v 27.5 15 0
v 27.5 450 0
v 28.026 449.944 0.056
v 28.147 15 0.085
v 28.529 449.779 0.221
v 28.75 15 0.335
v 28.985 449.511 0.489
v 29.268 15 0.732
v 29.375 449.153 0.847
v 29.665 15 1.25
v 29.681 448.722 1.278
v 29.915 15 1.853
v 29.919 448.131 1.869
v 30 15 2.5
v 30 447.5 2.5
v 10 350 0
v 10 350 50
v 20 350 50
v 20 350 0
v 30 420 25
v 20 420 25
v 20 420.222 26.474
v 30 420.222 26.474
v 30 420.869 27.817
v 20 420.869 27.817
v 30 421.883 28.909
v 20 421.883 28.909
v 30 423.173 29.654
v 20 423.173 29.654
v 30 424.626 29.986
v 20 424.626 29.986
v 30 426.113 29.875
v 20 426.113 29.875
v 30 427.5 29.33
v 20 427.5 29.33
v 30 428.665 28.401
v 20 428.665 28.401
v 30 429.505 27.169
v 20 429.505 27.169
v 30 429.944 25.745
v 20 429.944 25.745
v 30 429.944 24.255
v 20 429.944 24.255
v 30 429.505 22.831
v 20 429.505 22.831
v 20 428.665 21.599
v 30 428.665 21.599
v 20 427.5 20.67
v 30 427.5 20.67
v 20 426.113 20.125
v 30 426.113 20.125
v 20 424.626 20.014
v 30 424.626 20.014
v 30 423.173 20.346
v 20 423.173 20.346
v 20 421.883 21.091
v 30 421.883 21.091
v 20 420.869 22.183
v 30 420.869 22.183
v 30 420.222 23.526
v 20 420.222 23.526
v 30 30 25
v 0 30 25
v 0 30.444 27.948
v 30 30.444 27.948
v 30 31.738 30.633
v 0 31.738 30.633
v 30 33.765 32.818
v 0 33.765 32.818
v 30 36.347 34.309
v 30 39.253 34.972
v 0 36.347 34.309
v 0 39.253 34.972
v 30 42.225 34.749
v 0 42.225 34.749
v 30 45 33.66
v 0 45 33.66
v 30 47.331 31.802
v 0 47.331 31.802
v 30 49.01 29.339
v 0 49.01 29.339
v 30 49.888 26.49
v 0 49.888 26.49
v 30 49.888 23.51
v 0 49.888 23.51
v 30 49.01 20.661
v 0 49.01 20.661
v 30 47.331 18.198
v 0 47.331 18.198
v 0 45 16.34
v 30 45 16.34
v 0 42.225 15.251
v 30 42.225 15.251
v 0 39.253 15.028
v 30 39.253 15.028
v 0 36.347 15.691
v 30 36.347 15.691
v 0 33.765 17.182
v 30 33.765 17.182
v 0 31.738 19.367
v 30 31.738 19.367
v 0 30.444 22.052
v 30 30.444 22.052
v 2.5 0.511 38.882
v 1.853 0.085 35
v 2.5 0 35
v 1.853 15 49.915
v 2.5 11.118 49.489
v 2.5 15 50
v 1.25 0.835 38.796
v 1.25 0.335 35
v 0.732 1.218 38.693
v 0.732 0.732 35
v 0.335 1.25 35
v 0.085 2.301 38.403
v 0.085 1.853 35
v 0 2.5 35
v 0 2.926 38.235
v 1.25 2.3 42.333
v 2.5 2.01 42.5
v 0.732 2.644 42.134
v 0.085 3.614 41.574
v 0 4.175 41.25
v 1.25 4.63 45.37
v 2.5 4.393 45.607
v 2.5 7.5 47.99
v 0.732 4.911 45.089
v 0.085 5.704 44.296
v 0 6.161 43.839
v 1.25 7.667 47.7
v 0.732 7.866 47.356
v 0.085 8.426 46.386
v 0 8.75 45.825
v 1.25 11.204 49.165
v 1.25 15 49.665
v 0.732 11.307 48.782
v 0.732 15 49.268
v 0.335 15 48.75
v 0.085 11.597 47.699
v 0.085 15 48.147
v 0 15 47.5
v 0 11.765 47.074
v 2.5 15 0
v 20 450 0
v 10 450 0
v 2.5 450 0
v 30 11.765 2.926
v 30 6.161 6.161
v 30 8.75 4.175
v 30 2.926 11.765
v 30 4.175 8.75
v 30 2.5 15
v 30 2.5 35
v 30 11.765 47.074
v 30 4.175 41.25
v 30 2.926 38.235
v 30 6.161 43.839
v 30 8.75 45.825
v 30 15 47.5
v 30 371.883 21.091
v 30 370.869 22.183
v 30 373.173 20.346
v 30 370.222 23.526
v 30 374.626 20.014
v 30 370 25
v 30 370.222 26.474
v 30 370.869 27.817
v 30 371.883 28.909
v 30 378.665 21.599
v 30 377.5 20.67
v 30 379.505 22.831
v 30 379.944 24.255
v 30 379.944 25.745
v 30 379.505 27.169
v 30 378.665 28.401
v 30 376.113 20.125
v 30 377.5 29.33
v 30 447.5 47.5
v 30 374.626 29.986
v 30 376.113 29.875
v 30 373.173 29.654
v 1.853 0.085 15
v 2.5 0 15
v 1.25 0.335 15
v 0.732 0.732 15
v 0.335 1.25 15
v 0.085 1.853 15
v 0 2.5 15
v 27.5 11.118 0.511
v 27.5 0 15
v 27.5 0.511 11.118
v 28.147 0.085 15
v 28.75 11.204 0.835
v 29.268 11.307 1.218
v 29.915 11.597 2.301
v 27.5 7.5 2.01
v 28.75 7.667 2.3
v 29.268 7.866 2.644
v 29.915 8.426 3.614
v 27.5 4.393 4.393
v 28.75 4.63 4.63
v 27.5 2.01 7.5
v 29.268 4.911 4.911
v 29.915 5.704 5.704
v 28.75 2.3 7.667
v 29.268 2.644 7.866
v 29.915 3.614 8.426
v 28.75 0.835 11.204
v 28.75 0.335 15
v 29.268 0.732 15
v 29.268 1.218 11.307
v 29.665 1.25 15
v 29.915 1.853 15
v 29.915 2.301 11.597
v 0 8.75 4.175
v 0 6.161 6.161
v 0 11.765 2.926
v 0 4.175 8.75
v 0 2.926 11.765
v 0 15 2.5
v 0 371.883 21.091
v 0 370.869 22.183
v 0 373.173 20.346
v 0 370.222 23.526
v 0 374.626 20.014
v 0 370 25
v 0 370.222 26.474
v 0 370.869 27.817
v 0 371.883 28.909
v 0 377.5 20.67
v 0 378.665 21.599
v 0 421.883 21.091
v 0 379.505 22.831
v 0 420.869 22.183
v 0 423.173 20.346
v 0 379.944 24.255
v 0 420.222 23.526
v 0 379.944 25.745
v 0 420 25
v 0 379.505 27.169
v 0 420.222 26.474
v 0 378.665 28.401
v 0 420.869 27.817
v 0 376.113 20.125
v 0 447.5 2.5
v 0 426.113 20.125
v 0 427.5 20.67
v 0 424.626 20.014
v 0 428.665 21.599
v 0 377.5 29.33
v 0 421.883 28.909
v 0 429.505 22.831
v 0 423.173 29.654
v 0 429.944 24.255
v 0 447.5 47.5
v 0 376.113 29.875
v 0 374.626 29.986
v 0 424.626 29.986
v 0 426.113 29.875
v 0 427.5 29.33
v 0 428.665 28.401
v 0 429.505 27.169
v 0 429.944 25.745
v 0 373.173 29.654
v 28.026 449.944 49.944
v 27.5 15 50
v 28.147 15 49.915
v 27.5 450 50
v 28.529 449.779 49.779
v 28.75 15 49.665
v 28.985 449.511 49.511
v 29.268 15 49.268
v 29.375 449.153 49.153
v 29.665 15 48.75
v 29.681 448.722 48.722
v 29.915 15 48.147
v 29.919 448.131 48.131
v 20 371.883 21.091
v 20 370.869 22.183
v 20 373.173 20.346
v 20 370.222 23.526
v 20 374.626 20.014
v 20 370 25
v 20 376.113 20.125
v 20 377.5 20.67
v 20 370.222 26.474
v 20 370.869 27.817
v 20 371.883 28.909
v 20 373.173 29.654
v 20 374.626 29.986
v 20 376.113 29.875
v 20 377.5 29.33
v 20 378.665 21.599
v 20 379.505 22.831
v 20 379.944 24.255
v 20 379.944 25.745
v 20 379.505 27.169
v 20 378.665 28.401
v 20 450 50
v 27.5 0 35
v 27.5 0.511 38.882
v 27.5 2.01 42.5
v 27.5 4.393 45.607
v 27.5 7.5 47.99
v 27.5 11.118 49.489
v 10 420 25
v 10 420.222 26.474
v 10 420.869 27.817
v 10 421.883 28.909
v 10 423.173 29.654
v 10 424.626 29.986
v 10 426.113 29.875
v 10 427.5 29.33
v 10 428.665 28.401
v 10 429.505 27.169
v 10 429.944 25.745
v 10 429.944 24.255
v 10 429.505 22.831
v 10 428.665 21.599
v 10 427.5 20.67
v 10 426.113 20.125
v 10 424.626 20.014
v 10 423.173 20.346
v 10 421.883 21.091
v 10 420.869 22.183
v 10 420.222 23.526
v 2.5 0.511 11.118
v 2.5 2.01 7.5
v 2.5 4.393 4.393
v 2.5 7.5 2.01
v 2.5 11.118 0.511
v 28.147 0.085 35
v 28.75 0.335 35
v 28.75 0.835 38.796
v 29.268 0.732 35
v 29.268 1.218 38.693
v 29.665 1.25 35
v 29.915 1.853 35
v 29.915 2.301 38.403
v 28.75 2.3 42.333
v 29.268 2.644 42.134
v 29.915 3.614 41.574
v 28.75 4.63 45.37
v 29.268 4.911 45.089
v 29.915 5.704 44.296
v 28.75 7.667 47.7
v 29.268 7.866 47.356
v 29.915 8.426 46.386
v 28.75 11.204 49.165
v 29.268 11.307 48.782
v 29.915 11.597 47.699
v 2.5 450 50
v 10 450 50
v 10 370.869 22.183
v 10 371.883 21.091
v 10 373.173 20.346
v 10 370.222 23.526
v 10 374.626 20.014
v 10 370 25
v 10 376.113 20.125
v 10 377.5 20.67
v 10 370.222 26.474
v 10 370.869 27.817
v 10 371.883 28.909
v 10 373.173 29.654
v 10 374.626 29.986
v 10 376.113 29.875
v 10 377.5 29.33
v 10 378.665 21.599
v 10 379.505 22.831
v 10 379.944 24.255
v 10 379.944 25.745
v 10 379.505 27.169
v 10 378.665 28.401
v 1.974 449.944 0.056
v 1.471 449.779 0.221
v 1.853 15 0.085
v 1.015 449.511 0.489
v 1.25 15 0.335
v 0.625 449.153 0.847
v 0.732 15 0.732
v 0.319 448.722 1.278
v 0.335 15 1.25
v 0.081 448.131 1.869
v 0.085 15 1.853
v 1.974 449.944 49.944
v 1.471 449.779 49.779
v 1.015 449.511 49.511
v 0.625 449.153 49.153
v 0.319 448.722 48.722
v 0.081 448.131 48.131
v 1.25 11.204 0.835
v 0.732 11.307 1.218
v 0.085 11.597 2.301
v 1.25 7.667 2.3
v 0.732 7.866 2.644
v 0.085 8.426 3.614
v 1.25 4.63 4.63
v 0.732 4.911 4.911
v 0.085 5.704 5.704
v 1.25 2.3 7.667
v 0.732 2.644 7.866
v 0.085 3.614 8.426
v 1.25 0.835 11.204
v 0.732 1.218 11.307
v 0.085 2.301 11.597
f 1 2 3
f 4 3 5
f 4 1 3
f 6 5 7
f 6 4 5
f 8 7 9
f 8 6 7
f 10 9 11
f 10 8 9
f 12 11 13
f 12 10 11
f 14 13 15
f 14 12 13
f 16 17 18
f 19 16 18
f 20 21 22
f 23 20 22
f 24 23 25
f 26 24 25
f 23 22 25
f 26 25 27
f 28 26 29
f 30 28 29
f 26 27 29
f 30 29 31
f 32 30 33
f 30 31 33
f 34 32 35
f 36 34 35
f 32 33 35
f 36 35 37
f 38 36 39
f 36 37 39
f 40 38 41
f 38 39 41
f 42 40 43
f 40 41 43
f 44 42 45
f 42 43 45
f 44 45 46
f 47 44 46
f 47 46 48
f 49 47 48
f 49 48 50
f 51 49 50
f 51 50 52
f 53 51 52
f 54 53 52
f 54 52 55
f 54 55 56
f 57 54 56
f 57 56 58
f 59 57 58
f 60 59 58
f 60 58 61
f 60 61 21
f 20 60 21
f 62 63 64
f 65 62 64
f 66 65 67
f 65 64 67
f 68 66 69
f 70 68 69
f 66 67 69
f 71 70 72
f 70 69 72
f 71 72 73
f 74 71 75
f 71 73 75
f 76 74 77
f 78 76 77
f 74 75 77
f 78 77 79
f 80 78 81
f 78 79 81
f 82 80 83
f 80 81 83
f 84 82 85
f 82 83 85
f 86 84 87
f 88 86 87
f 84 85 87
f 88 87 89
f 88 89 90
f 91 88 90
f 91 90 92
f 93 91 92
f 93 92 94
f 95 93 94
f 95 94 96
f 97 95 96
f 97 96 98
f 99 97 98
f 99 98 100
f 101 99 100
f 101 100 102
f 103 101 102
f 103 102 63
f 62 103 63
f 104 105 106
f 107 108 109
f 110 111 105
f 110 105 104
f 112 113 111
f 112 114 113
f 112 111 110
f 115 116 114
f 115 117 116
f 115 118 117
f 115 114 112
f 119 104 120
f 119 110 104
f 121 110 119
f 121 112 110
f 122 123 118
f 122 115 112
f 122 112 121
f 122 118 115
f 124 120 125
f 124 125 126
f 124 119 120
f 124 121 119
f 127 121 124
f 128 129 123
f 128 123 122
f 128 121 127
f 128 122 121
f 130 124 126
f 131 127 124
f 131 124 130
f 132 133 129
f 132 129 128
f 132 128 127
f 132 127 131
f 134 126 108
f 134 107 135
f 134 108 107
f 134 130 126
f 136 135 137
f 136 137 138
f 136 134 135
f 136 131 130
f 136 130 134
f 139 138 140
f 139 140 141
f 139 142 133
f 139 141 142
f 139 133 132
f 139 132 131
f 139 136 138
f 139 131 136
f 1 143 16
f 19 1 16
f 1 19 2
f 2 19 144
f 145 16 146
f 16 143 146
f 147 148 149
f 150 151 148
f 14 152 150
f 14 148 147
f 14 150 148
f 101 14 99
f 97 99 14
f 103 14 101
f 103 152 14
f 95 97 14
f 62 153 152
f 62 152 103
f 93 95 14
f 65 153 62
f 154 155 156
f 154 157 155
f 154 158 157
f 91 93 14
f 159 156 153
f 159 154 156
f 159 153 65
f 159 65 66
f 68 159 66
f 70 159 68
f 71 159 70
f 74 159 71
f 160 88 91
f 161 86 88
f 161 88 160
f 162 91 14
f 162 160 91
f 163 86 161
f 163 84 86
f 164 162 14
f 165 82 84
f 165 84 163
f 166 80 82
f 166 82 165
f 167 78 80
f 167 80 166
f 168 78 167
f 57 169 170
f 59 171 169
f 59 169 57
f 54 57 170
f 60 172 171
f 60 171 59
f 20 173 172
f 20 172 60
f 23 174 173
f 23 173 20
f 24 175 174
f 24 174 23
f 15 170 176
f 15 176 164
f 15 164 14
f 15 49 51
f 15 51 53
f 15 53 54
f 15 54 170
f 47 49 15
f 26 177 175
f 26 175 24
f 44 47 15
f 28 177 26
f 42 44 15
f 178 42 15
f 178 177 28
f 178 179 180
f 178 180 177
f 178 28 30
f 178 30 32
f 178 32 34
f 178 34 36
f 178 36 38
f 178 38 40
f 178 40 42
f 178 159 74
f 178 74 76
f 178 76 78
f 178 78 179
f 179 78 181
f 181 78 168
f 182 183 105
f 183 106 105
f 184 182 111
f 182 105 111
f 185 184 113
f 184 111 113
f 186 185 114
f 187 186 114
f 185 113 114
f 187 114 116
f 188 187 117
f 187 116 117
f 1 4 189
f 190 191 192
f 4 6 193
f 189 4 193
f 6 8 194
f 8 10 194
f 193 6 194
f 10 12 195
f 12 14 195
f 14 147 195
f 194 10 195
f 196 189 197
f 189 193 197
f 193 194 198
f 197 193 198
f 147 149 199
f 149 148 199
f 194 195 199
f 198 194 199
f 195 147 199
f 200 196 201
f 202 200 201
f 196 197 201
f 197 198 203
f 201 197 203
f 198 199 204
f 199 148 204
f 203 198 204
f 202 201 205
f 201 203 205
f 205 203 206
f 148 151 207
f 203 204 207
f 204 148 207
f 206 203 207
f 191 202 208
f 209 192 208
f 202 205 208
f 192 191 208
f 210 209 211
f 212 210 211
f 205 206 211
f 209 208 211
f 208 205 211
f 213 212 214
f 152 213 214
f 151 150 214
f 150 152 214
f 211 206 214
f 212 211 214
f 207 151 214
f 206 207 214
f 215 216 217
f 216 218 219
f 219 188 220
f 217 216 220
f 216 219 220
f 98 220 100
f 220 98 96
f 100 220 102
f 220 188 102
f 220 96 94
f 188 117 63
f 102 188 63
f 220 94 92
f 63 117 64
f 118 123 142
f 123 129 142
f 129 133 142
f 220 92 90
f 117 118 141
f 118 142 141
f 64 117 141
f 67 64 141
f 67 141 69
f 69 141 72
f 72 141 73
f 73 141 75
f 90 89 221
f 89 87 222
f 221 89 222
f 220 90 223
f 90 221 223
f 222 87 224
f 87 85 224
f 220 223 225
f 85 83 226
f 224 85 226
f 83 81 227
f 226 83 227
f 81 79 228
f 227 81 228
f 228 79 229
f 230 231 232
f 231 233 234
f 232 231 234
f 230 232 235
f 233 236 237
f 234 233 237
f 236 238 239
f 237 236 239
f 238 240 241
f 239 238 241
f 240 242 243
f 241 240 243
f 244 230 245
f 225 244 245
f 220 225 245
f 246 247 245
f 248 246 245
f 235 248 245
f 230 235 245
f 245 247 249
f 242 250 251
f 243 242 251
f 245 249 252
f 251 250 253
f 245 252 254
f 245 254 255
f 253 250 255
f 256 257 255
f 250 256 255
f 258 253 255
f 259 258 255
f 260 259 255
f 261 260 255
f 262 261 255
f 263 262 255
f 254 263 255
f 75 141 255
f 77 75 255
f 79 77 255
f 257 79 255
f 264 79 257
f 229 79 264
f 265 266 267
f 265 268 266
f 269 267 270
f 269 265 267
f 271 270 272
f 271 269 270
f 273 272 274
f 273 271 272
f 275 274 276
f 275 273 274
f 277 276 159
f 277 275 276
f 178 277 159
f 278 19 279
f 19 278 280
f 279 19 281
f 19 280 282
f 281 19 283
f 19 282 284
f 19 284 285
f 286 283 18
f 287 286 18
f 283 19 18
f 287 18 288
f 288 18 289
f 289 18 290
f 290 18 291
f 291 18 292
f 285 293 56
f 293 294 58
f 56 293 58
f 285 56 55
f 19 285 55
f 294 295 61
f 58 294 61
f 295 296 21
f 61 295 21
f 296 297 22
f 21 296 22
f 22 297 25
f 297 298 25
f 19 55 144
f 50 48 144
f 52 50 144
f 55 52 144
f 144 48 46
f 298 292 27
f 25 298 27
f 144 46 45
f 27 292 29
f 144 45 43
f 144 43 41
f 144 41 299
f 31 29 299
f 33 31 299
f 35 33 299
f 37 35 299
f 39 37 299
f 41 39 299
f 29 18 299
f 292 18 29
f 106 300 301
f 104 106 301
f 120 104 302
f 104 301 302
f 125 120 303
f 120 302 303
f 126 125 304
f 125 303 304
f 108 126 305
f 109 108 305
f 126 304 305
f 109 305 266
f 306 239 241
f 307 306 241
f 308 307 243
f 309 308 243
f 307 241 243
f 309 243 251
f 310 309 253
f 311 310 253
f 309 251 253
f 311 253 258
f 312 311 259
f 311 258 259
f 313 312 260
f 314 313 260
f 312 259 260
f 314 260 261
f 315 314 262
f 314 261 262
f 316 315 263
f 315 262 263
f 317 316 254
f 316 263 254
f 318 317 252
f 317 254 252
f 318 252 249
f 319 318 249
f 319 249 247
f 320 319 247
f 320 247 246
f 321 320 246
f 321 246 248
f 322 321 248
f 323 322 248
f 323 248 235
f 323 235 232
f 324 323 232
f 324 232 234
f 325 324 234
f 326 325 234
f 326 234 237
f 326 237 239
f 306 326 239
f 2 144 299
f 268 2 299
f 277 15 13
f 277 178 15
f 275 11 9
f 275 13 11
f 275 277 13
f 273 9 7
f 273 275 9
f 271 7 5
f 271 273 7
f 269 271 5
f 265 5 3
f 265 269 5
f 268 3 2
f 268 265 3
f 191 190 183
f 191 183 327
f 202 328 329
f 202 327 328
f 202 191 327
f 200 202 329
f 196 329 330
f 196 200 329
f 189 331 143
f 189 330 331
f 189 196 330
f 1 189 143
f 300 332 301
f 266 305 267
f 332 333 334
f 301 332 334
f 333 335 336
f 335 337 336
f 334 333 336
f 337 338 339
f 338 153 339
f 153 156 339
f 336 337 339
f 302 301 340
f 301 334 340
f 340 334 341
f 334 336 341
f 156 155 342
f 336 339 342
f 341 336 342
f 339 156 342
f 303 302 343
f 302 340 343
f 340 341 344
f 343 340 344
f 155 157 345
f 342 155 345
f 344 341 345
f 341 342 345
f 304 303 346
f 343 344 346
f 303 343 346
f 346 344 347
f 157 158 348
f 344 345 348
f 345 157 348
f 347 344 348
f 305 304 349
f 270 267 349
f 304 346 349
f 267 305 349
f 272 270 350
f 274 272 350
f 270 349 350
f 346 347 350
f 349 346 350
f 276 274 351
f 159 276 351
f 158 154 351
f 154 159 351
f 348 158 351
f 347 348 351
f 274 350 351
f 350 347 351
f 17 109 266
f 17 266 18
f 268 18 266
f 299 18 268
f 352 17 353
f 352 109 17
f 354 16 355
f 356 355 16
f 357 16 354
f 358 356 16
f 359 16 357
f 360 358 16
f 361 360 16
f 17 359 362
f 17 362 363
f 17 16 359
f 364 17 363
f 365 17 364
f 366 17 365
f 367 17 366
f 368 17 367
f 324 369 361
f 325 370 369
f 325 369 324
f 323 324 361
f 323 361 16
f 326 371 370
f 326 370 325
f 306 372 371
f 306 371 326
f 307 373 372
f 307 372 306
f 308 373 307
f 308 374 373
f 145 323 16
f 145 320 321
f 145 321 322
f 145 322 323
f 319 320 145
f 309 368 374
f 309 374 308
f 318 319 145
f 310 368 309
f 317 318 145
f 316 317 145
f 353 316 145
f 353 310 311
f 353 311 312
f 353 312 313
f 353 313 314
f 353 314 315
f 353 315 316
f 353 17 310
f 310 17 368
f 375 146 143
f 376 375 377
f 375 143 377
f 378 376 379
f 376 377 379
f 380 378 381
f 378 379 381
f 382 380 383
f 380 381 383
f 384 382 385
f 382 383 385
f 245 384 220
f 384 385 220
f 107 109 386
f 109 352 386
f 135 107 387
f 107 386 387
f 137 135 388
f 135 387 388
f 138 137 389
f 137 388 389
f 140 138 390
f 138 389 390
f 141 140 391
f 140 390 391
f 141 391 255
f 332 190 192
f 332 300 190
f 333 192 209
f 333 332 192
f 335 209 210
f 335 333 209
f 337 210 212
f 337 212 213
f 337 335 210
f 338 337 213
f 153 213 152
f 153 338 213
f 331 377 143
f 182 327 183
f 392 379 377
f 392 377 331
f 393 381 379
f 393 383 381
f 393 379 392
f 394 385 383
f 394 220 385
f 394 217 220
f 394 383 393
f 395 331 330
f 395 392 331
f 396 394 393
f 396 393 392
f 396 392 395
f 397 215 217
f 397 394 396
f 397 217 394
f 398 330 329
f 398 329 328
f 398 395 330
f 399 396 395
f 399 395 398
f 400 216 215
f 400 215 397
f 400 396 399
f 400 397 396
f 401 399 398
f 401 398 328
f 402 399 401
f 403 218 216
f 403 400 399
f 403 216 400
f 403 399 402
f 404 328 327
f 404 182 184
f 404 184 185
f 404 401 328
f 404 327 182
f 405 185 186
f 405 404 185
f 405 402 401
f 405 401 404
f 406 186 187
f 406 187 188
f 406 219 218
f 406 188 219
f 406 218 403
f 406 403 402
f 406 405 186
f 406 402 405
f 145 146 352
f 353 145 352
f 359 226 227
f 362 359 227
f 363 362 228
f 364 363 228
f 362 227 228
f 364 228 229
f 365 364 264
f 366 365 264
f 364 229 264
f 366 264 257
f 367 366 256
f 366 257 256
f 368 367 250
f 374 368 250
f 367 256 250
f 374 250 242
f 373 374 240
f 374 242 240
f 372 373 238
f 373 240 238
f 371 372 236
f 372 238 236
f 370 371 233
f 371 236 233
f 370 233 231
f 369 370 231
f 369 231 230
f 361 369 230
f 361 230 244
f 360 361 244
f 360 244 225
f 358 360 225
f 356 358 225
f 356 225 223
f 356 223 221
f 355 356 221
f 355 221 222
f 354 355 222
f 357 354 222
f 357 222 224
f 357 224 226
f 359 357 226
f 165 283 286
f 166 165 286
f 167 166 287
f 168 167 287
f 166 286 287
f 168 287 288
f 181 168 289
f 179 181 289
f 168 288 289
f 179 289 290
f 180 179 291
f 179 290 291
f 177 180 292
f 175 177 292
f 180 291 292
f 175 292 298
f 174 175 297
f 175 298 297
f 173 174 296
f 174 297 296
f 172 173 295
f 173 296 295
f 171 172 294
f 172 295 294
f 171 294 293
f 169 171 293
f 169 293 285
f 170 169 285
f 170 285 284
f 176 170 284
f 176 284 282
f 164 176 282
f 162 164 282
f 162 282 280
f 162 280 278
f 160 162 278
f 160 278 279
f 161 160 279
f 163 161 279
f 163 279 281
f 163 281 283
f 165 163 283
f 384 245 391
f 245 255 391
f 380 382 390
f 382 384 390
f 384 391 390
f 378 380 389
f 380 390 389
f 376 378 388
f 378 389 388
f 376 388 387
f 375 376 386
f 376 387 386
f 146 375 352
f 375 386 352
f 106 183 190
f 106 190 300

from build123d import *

# Parameters (mm, degrees)
F0_W     = 450
F0_H     = 50
F1_DEPTH = 30
F2_R     = 15
F3_W     = 10
F3_H     = 100
F4_DEPTH = 50.001
F5_R     = 2.5
F7_D     = 10
F7_DEPTH = 100
F8_R     = 10
F9_DEPTH = 30.001


with BuildPart() as f1:
    # F0 (on Right) → F1 (new body)
    with BuildSketch(Plane.YZ):
        with Locations((225, 25)):
            Rectangle(F0_W, F0_H)
    extrude(amount=F1_DEPTH)

    # F2
    f2_edges = [f1.edges().sort_by_distance(p)[0] for p in [
        (15, 0, 50),
        (15, 0, 0),
    ]]
    fillet(f2_edges, radius=F2_R)

    # F3 (on face) → F4 (cut, through all)
    with BuildSketch(Plane.XY.offset(50)):
        with Locations((15, 400)):
            Rectangle(F3_W, F3_H)
    extrude(amount=-F4_DEPTH, mode=Mode.SUBTRACT)

    # F5
    f5_edges = [f1.edges().sort_by_distance(p)[0] for p in [
        (30, 0, 25),
        (30, 4.393398, 45.606602),
        (30, 4.393398, 4.393398),
        (30, 232.5, 50),
        (30, 232.5, 0),
        (30, 450, 25),
        (0, 0, 25),
        (0, 4.393398, 45.606602),
        (0, 4.393398, 4.393398),
        (0, 232.5, 50),
        (0, 232.5, 0),
        (0, 450, 25),
    ]]
    fillet(f5_edges, radius=F5_R)

    # F7
    with Locations(Plane.YZ.offset(30)):
        with Locations((375, 25), (425, 25)):
            Hole(F7_D / 2, depth=F7_DEPTH)

    # F8 (on face) → F9 (cut, through all)
    with BuildSketch(Plane(origin=(0, 0, 0), x_dir=(0, -1, 0), z_dir=(-1, 0, 0))):
        with Locations((-40, 25)):
            Circle(F8_R)
    extrude(amount=-F9_DEPTH, mode=Mode.SUBTRACT)


solid = f1.part
